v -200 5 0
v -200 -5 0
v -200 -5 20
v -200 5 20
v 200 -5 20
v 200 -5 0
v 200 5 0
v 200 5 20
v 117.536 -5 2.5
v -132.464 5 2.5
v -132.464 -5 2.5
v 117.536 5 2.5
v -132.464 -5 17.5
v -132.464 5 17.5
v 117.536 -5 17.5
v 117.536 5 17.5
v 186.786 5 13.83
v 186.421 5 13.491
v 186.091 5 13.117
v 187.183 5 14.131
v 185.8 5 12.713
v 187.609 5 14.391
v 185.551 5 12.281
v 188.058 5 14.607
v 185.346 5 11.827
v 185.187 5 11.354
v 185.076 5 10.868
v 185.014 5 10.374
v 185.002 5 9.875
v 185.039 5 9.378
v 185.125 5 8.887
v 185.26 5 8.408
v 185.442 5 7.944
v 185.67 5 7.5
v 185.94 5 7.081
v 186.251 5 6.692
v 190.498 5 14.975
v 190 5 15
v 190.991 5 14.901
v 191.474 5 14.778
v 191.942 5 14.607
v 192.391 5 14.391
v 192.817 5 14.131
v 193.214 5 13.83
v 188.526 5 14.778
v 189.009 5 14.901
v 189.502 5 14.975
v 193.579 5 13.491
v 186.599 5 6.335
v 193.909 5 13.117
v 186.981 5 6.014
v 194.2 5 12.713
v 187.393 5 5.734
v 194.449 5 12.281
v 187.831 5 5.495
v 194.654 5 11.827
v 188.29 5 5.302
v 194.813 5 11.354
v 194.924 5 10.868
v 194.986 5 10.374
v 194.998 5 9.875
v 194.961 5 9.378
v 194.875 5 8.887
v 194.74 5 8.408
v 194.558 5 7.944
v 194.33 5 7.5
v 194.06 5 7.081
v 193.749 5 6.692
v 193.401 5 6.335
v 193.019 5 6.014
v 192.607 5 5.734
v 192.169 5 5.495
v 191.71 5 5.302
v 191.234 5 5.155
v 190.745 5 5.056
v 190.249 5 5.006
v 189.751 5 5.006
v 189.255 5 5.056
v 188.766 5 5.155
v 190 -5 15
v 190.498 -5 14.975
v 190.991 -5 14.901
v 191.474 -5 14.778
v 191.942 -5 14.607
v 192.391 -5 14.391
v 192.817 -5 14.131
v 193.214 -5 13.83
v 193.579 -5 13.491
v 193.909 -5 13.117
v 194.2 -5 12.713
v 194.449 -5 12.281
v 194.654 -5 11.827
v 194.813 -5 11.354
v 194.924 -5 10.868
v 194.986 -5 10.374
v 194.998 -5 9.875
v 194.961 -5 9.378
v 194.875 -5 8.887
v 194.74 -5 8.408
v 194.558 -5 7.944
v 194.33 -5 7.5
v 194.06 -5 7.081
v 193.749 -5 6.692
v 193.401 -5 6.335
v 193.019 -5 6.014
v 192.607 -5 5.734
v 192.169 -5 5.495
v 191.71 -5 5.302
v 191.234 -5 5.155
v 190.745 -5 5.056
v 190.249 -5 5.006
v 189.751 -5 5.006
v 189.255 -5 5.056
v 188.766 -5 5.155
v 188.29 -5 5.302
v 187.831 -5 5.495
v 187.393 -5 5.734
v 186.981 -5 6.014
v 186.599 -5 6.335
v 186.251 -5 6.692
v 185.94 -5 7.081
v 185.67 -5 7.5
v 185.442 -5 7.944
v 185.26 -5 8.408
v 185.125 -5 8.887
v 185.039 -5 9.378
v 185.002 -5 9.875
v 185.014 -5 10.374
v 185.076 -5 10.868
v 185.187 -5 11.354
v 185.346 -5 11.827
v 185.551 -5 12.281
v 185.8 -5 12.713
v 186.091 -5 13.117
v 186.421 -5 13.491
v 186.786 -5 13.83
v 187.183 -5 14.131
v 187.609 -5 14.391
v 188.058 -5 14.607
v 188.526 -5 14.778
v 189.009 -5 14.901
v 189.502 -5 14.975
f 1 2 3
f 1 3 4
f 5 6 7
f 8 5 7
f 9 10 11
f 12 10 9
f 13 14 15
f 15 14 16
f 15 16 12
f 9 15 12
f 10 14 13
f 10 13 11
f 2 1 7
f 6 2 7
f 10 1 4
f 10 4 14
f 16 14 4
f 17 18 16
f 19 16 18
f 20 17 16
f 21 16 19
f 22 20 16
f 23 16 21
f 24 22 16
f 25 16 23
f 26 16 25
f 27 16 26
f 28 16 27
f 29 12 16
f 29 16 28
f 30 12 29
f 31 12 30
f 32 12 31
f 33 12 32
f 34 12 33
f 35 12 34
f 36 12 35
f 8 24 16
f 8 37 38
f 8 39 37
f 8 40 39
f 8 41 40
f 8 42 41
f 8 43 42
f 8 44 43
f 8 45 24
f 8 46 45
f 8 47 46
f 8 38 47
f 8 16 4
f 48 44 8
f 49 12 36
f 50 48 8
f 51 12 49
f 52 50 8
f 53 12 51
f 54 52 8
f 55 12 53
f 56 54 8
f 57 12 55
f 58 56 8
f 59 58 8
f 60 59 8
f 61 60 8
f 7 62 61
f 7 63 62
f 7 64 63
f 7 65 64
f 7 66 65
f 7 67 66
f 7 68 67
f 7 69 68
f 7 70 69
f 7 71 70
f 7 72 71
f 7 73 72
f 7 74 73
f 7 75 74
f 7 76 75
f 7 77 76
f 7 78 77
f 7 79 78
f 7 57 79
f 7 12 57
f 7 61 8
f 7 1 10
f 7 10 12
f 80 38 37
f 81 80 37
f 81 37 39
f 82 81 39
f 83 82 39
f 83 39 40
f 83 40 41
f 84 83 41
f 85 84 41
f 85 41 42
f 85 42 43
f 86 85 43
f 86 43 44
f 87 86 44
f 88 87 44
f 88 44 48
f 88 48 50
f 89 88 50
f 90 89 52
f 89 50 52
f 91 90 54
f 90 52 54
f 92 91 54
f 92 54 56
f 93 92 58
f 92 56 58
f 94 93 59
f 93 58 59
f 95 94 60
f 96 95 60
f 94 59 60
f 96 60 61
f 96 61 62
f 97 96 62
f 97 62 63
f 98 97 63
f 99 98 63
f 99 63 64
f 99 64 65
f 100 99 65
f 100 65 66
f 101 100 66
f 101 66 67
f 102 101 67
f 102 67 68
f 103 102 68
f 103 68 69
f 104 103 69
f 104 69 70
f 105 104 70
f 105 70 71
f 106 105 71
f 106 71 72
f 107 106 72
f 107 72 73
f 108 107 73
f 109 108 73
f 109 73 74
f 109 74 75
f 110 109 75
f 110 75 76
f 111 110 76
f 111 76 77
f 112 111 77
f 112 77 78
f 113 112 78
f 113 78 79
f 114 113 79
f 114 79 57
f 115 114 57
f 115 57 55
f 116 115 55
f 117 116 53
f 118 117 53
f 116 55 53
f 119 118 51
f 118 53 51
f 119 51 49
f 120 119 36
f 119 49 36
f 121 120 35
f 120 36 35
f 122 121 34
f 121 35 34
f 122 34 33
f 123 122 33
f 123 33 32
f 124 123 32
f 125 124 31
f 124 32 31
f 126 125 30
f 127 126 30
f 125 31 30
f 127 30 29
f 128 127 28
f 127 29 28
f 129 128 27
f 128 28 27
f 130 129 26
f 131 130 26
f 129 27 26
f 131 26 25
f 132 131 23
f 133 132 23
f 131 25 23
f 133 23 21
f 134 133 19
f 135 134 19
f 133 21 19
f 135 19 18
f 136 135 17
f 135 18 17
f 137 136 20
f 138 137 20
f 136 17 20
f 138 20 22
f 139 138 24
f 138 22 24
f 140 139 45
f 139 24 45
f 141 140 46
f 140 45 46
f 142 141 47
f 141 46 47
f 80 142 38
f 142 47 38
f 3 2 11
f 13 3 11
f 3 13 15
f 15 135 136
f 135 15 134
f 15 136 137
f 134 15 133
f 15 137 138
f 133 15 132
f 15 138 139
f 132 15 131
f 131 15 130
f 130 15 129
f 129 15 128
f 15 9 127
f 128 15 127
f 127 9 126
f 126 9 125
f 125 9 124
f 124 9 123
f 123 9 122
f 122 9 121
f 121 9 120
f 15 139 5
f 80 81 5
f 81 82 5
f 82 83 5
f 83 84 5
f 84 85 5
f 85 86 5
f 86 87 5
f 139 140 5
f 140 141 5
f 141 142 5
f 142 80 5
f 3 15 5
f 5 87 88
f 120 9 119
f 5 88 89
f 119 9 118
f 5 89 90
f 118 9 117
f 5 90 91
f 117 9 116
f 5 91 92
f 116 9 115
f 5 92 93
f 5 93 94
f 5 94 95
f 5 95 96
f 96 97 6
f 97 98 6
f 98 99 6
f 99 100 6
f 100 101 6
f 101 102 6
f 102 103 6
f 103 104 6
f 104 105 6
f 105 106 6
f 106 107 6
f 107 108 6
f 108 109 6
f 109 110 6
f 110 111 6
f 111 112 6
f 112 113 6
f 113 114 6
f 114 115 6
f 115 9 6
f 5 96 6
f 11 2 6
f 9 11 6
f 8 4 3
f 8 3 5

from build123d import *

# Parameters (mm, degrees)
SKETCH_1_W          = 400
SKETCH_1_H          = 10
EXTRUDE_1_DEPTH     = 20
SKETCH_2_W          = 250
SKETCH_2_H          = 15
CUT_EXTRUDE_1_DEPTH = 20
SKETCH_4_R          = 5
CUT_EXTRUDE_3_DEPTH = 20


with BuildPart() as part:
    # Эскиз1 → Бобышка-Вытянуть1 (new body)
    with BuildSketch(Plane.XY):
        Rectangle(SKETCH_1_W, SKETCH_1_H)
    extrude(amount=EXTRUDE_1_DEPTH)

    # Эскиз2 → Вырез-Вытянуть1 (cut)
    with BuildSketch(Plane(origin=(0, 5, 0), x_dir=(1, 0, 0), z_dir=(0, 1, 0))):
        with Locations((-7.463718673, -10)):
            Rectangle(SKETCH_2_W, SKETCH_2_H)
    extrude(amount=-CUT_EXTRUDE_1_DEPTH, mode=Mode.SUBTRACT)

    # Эскиз4 → Вырез-Вытянуть3 (cut)
    with BuildSketch(Plane(origin=(0, 5, 0), x_dir=(1, 0, 0), z_dir=(0, 1, 0))):
        with Locations(Location((190, -10, 0), (0, 0, 270))):
            Circle(SKETCH_4_R)
    extrude(amount=-CUT_EXTRUDE_3_DEPTH, mode=Mode.SUBTRACT)


solid = part.part
